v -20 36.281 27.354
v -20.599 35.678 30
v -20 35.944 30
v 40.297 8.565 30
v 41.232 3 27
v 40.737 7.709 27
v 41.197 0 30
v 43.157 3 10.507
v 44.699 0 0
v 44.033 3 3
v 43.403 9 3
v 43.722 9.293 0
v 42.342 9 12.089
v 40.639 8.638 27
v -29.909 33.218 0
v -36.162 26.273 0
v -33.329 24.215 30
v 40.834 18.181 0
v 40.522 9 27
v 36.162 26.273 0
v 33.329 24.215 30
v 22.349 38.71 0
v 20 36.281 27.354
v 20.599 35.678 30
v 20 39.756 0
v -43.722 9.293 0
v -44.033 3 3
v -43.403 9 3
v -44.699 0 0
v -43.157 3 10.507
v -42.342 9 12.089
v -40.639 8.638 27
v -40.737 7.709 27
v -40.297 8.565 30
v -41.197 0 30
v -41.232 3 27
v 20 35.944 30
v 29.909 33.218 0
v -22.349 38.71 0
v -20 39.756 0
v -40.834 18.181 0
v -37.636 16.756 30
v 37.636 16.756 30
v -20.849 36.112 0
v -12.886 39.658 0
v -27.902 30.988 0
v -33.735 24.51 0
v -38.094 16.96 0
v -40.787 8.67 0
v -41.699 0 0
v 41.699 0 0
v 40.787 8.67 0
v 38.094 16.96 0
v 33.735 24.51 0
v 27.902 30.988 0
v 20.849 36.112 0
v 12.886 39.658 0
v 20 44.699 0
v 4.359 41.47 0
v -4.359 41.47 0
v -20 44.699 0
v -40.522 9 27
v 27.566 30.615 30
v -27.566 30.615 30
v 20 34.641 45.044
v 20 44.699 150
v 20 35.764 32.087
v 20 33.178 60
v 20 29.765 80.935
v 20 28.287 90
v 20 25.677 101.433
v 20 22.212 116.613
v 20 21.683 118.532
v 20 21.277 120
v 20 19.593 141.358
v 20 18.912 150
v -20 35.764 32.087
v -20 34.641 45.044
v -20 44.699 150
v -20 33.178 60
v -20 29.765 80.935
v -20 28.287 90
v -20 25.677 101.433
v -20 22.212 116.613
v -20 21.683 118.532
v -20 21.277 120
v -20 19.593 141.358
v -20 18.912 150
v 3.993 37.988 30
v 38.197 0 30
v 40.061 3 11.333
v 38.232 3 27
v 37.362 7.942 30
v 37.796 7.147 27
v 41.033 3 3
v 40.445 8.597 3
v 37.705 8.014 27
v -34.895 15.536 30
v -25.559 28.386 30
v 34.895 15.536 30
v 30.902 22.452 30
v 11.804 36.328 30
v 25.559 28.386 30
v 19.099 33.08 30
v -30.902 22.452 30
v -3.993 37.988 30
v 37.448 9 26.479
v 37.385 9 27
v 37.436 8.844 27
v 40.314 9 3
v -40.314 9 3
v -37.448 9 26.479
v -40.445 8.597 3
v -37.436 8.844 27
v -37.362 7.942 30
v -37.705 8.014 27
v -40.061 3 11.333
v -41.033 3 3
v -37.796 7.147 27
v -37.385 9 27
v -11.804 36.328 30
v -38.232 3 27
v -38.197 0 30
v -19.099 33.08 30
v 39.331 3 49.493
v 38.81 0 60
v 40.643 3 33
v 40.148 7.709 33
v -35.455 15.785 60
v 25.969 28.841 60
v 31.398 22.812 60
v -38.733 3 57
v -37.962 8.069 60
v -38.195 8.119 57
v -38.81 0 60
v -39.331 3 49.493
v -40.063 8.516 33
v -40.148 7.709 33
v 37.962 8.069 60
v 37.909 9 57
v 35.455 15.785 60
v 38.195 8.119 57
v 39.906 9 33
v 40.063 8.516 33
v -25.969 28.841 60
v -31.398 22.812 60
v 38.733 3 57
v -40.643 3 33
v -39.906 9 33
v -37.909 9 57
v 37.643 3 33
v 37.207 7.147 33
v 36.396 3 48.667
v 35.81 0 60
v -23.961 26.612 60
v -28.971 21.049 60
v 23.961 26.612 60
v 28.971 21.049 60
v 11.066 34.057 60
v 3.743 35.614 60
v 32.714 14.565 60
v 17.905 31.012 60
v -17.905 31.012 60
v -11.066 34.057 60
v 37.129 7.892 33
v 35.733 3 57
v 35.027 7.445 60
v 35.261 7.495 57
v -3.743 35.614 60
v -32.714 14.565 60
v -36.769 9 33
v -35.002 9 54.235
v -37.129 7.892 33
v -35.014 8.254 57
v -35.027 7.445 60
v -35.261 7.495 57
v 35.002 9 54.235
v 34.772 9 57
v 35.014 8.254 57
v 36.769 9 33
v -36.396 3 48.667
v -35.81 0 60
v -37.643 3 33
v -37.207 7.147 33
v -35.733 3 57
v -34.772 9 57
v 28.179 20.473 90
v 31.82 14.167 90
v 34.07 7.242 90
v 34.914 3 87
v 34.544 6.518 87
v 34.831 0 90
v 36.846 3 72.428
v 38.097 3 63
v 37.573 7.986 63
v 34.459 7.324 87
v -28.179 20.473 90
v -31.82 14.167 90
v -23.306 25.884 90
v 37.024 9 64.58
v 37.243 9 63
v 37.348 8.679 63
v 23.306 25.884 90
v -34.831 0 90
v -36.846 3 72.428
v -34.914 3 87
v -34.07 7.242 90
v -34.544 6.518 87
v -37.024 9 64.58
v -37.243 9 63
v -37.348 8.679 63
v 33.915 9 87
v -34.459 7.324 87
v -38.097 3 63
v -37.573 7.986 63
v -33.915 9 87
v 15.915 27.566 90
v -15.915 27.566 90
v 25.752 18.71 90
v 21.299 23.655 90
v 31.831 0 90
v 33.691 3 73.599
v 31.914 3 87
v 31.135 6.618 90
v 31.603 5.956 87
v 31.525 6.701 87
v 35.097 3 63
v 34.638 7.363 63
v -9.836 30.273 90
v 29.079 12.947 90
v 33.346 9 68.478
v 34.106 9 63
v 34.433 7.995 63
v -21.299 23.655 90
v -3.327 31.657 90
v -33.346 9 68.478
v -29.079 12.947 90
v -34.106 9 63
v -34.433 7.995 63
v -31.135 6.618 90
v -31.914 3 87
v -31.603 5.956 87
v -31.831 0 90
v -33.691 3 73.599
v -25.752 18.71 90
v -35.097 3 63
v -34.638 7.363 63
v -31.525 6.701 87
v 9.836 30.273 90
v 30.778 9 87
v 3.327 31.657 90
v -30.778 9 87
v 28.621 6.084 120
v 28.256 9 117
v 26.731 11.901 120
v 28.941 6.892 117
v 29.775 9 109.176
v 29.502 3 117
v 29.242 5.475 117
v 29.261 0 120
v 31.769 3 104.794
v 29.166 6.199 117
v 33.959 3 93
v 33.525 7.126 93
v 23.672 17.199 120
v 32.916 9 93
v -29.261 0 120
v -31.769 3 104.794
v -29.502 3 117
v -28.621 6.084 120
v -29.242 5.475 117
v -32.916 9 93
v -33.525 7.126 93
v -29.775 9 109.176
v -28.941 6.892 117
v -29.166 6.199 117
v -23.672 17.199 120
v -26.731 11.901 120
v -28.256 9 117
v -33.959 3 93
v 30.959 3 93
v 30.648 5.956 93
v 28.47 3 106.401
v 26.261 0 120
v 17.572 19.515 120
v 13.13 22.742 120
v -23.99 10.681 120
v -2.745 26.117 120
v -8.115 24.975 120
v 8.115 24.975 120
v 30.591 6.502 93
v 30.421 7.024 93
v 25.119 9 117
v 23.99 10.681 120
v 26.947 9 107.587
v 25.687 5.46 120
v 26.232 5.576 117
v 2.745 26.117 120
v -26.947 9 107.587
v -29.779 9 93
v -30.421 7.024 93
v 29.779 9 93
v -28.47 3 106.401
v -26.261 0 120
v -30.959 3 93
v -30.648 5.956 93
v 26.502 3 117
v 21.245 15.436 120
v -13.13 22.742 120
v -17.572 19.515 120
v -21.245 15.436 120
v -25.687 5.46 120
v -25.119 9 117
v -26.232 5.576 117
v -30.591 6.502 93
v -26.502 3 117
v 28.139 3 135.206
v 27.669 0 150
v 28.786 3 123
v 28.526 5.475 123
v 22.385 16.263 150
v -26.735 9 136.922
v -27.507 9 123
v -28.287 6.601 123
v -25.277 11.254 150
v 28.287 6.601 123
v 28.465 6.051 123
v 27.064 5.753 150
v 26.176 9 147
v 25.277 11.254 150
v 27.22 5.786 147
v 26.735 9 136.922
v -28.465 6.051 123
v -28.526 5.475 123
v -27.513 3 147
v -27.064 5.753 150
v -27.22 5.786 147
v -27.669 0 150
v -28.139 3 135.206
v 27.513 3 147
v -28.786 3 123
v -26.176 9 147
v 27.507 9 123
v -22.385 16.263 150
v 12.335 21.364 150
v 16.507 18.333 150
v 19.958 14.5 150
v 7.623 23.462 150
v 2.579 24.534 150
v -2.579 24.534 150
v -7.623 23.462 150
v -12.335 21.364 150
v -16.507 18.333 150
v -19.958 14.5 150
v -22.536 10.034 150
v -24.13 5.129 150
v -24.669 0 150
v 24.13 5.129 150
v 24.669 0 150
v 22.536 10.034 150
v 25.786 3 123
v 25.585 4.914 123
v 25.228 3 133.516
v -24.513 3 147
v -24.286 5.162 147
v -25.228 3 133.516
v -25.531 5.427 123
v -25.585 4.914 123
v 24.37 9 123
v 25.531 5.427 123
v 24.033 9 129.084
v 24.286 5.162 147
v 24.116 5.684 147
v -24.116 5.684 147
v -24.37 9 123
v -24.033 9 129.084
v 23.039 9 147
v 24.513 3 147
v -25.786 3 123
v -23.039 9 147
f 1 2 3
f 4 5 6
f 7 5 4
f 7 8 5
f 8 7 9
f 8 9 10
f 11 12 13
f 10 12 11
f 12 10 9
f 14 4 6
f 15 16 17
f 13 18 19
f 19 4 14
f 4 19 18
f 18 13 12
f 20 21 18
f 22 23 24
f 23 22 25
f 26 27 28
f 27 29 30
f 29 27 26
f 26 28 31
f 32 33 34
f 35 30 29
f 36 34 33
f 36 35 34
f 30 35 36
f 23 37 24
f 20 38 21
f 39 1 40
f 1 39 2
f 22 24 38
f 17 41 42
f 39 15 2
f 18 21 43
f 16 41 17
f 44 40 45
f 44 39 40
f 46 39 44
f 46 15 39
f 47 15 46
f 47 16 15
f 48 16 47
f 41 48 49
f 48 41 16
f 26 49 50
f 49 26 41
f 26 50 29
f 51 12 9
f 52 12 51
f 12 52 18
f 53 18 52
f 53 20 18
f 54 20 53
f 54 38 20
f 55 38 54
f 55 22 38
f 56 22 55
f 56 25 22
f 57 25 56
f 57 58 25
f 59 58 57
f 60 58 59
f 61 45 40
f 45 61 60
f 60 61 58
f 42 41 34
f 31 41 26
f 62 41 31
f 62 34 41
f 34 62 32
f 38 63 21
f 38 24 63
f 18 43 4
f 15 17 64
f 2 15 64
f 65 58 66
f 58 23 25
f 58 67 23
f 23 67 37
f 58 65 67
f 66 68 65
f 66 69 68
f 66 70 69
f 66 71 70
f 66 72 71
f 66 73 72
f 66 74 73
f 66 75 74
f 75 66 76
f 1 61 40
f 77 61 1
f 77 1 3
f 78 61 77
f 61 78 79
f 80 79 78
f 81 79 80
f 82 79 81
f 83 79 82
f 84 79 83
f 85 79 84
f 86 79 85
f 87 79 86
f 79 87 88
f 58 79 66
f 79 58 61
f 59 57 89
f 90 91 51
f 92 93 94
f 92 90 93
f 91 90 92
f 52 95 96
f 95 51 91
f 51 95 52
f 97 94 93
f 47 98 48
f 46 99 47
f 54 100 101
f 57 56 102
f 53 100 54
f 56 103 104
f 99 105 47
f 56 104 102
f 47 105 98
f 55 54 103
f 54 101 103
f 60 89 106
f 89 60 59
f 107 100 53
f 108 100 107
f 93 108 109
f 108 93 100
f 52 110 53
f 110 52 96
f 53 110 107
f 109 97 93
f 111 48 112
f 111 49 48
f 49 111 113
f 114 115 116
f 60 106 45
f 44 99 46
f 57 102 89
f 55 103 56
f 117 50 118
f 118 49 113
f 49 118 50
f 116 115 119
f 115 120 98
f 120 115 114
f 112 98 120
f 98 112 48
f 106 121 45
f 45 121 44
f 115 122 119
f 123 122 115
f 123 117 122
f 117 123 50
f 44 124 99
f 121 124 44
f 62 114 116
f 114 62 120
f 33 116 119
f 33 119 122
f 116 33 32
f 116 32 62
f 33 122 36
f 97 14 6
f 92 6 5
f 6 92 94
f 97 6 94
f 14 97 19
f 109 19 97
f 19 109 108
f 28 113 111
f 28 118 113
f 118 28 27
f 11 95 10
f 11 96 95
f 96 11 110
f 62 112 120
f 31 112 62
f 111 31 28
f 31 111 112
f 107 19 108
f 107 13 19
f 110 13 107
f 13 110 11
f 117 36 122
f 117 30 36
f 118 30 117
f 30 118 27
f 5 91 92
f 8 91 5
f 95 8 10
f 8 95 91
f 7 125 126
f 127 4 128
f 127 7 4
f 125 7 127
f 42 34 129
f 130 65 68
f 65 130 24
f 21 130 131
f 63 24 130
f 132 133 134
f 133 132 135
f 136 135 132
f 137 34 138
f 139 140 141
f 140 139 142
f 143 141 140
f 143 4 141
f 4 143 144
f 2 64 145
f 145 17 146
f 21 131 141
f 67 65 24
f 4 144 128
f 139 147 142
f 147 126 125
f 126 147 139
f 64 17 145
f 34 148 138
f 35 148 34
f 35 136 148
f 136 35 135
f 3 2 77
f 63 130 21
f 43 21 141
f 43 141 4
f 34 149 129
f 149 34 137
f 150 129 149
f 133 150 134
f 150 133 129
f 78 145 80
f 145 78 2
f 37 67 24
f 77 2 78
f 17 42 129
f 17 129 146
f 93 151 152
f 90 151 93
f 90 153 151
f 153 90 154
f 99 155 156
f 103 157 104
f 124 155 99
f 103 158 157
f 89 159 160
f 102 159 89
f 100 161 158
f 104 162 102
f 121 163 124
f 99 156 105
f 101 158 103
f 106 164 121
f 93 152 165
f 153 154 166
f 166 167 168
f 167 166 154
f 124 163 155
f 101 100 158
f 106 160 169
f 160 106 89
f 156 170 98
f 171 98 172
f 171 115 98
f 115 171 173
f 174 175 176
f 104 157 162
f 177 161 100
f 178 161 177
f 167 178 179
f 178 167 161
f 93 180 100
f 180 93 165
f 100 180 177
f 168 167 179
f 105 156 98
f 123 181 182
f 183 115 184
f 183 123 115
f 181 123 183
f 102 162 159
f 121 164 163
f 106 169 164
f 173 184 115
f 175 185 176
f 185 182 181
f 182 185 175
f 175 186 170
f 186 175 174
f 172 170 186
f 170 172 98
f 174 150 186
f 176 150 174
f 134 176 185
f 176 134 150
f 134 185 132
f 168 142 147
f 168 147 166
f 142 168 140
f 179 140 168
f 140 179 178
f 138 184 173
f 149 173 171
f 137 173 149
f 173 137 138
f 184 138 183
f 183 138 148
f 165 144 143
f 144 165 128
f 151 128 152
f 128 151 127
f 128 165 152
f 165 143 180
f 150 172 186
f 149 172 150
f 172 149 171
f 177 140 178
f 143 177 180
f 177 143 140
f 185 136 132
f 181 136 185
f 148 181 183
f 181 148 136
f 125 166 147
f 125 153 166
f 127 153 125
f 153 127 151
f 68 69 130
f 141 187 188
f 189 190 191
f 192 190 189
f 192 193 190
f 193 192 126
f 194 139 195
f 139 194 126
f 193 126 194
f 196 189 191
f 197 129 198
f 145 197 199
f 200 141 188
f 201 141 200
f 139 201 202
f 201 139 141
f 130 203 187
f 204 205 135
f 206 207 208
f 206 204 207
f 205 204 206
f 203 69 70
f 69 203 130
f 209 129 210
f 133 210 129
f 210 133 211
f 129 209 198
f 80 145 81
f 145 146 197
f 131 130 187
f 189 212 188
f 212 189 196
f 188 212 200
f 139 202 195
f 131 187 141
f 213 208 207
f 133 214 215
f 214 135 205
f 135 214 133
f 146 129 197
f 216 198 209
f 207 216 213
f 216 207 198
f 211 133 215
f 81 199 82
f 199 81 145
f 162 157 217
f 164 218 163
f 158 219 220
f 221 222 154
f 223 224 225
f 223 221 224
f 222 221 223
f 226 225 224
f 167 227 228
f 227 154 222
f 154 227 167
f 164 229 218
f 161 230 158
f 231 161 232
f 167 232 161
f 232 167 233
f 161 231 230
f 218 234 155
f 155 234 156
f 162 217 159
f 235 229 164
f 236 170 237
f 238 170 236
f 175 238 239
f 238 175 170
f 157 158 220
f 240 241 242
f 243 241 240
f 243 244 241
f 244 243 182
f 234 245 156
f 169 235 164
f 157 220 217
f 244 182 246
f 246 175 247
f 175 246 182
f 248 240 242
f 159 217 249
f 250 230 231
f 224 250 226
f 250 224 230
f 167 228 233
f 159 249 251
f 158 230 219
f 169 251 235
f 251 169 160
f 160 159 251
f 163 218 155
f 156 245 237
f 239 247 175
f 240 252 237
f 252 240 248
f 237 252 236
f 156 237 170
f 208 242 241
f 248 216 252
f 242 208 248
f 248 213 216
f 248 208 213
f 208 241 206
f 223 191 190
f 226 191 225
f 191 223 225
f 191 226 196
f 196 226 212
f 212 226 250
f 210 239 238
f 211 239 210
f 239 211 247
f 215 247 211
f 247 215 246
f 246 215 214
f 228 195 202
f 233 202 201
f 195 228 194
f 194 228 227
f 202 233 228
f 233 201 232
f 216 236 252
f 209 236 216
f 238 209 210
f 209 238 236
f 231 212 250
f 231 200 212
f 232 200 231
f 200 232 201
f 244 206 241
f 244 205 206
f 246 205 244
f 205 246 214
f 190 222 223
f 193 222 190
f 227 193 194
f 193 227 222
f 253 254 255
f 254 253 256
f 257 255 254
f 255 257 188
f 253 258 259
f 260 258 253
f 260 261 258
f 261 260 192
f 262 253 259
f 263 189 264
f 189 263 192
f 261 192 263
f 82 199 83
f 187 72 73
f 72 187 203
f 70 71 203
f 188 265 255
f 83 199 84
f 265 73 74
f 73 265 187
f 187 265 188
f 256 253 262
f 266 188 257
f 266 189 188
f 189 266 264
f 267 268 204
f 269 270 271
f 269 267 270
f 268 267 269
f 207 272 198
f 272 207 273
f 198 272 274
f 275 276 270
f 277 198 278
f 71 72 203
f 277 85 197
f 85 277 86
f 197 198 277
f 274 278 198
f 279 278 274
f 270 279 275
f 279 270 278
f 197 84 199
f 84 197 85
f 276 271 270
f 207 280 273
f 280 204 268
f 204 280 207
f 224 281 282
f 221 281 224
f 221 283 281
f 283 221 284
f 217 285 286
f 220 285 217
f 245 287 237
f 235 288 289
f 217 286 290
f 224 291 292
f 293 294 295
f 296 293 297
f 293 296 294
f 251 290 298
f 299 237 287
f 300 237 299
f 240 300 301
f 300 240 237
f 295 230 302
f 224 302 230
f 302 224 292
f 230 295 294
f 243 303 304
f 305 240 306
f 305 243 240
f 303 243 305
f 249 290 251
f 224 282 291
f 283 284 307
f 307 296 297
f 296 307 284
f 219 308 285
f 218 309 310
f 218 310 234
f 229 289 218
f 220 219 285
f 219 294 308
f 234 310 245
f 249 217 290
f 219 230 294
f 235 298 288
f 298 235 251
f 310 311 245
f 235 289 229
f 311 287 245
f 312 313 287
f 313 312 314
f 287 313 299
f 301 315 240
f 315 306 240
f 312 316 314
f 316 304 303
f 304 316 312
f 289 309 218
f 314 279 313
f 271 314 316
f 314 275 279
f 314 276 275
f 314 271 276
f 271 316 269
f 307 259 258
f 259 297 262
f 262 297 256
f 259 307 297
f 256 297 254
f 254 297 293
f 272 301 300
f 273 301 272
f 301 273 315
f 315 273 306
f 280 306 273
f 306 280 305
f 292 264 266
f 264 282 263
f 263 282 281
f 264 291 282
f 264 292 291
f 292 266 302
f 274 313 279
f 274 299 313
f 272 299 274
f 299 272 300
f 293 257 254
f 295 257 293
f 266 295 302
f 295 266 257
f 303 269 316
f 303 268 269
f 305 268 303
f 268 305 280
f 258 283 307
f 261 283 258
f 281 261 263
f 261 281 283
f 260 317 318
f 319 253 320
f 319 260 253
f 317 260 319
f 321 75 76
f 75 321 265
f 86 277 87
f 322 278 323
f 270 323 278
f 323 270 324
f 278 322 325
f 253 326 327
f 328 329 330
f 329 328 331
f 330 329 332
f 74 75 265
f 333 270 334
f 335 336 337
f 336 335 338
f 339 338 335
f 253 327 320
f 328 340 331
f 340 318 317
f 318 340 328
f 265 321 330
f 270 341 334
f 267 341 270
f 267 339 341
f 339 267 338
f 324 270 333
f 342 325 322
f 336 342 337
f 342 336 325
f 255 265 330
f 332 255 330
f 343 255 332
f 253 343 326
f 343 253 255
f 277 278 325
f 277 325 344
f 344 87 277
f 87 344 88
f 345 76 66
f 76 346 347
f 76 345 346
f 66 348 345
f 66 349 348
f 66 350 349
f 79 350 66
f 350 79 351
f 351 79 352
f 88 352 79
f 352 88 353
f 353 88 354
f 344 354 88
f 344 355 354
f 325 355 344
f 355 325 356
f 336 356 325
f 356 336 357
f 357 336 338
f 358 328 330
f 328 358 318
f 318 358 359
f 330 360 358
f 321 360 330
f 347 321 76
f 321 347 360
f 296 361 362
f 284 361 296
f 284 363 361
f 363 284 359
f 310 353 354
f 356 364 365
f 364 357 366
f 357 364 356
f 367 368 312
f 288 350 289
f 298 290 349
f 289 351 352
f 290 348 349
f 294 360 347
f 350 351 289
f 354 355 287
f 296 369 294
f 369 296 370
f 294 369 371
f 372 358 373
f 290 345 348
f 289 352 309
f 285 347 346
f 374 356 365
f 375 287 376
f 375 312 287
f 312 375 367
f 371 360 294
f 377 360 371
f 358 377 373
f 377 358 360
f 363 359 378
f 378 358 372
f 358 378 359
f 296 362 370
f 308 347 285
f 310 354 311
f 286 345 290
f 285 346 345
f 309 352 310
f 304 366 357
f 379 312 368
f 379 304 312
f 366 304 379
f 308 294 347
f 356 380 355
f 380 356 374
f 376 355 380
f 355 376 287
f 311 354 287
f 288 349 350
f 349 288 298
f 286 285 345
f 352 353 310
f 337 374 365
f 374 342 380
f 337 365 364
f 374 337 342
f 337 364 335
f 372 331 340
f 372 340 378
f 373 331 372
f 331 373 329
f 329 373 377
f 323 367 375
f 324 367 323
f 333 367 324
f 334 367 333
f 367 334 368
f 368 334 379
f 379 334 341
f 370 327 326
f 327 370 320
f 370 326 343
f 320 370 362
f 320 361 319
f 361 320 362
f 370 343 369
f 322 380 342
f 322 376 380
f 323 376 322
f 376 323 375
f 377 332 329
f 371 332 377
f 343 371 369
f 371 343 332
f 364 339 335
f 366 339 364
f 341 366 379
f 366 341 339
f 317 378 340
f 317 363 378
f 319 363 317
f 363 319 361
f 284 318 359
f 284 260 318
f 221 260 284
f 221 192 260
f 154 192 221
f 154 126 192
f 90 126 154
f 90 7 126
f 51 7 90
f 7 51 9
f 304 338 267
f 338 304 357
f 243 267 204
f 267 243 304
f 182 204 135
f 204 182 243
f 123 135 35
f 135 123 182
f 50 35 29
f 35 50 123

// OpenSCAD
difference()  {
union()  {
translate([0.0,0.0,0.0])difference()  {
union()  {
cylinder(r1=44.69859509007658,r2=41.197186342054884,h=30.0);
translate([-20.0,0.0,0.0])cube([40.0,44.69859509007658,30.0]);
}
cylinder(r1=41.69859509007658,r2=38.197186342054884,h=30.0);
translate([-44.69859509007658,3.0,3.0])cube([89.39719018015316,6.0,24.0]);
}
translate([0.0,0.0,30.0])difference()  {
union()  {
cylinder(r1=41.197186342054884,r2=38.80986219567645,h=30.0);
translate([-20.0,0.0,0.0])cube([40.0,44.69859509007658,30.0]);
}
cylinder(r1=38.197186342054884,r2=35.80986219567645,h=30.0);
translate([-44.69859509007658,3.0,3.0])cube([89.39719018015316,6.0,24.0]);
}
translate([0.0,0.0,60.0])difference()  {
union()  {
cylinder(r1=38.80986219567645,r2=34.83098861837907,h=30.0);
translate([-20.0,0.0,0.0])cube([40.0,44.69859509007658,30.0]);
}
cylinder(r1=35.80986219567645,r2=31.830988618379067,h=30.0);
translate([-44.69859509007658,3.0,3.0])cube([89.39719018015316,6.0,24.0]);
}
translate([0.0,0.0,90.0])difference()  {
union()  {
cylinder(r1=34.83098861837907,r2=29.26056561016273,h=30.0);
translate([-20.0,0.0,0.0])cube([40.0,44.69859509007658,30.0]);
}
cylinder(r1=31.830988618379067,r2=26.260565610162732,h=30.0);
translate([-44.69859509007658,3.0,3.0])cube([89.39719018015316,6.0,24.0]);
}
translate([0.0,0.0,120.0])difference()  {
union()  {
cylinder(r1=29.26056561016273,r2=27.669016179243776,h=30.0);
translate([-20.0,0.0,0.0])cube([40.0,44.69859509007658,30.0]);
}
cylinder(r1=26.260565610162732,r2=24.669016179243776,h=30.0);
translate([-44.69859509007658,3.0,3.0])cube([89.39719018015316,6.0,24.0]);
}
}
translate([-44.69859509007658,-44.69859509007658,0.0])cube([89.39719018015316,44.69859509007658,180.0]);
}
